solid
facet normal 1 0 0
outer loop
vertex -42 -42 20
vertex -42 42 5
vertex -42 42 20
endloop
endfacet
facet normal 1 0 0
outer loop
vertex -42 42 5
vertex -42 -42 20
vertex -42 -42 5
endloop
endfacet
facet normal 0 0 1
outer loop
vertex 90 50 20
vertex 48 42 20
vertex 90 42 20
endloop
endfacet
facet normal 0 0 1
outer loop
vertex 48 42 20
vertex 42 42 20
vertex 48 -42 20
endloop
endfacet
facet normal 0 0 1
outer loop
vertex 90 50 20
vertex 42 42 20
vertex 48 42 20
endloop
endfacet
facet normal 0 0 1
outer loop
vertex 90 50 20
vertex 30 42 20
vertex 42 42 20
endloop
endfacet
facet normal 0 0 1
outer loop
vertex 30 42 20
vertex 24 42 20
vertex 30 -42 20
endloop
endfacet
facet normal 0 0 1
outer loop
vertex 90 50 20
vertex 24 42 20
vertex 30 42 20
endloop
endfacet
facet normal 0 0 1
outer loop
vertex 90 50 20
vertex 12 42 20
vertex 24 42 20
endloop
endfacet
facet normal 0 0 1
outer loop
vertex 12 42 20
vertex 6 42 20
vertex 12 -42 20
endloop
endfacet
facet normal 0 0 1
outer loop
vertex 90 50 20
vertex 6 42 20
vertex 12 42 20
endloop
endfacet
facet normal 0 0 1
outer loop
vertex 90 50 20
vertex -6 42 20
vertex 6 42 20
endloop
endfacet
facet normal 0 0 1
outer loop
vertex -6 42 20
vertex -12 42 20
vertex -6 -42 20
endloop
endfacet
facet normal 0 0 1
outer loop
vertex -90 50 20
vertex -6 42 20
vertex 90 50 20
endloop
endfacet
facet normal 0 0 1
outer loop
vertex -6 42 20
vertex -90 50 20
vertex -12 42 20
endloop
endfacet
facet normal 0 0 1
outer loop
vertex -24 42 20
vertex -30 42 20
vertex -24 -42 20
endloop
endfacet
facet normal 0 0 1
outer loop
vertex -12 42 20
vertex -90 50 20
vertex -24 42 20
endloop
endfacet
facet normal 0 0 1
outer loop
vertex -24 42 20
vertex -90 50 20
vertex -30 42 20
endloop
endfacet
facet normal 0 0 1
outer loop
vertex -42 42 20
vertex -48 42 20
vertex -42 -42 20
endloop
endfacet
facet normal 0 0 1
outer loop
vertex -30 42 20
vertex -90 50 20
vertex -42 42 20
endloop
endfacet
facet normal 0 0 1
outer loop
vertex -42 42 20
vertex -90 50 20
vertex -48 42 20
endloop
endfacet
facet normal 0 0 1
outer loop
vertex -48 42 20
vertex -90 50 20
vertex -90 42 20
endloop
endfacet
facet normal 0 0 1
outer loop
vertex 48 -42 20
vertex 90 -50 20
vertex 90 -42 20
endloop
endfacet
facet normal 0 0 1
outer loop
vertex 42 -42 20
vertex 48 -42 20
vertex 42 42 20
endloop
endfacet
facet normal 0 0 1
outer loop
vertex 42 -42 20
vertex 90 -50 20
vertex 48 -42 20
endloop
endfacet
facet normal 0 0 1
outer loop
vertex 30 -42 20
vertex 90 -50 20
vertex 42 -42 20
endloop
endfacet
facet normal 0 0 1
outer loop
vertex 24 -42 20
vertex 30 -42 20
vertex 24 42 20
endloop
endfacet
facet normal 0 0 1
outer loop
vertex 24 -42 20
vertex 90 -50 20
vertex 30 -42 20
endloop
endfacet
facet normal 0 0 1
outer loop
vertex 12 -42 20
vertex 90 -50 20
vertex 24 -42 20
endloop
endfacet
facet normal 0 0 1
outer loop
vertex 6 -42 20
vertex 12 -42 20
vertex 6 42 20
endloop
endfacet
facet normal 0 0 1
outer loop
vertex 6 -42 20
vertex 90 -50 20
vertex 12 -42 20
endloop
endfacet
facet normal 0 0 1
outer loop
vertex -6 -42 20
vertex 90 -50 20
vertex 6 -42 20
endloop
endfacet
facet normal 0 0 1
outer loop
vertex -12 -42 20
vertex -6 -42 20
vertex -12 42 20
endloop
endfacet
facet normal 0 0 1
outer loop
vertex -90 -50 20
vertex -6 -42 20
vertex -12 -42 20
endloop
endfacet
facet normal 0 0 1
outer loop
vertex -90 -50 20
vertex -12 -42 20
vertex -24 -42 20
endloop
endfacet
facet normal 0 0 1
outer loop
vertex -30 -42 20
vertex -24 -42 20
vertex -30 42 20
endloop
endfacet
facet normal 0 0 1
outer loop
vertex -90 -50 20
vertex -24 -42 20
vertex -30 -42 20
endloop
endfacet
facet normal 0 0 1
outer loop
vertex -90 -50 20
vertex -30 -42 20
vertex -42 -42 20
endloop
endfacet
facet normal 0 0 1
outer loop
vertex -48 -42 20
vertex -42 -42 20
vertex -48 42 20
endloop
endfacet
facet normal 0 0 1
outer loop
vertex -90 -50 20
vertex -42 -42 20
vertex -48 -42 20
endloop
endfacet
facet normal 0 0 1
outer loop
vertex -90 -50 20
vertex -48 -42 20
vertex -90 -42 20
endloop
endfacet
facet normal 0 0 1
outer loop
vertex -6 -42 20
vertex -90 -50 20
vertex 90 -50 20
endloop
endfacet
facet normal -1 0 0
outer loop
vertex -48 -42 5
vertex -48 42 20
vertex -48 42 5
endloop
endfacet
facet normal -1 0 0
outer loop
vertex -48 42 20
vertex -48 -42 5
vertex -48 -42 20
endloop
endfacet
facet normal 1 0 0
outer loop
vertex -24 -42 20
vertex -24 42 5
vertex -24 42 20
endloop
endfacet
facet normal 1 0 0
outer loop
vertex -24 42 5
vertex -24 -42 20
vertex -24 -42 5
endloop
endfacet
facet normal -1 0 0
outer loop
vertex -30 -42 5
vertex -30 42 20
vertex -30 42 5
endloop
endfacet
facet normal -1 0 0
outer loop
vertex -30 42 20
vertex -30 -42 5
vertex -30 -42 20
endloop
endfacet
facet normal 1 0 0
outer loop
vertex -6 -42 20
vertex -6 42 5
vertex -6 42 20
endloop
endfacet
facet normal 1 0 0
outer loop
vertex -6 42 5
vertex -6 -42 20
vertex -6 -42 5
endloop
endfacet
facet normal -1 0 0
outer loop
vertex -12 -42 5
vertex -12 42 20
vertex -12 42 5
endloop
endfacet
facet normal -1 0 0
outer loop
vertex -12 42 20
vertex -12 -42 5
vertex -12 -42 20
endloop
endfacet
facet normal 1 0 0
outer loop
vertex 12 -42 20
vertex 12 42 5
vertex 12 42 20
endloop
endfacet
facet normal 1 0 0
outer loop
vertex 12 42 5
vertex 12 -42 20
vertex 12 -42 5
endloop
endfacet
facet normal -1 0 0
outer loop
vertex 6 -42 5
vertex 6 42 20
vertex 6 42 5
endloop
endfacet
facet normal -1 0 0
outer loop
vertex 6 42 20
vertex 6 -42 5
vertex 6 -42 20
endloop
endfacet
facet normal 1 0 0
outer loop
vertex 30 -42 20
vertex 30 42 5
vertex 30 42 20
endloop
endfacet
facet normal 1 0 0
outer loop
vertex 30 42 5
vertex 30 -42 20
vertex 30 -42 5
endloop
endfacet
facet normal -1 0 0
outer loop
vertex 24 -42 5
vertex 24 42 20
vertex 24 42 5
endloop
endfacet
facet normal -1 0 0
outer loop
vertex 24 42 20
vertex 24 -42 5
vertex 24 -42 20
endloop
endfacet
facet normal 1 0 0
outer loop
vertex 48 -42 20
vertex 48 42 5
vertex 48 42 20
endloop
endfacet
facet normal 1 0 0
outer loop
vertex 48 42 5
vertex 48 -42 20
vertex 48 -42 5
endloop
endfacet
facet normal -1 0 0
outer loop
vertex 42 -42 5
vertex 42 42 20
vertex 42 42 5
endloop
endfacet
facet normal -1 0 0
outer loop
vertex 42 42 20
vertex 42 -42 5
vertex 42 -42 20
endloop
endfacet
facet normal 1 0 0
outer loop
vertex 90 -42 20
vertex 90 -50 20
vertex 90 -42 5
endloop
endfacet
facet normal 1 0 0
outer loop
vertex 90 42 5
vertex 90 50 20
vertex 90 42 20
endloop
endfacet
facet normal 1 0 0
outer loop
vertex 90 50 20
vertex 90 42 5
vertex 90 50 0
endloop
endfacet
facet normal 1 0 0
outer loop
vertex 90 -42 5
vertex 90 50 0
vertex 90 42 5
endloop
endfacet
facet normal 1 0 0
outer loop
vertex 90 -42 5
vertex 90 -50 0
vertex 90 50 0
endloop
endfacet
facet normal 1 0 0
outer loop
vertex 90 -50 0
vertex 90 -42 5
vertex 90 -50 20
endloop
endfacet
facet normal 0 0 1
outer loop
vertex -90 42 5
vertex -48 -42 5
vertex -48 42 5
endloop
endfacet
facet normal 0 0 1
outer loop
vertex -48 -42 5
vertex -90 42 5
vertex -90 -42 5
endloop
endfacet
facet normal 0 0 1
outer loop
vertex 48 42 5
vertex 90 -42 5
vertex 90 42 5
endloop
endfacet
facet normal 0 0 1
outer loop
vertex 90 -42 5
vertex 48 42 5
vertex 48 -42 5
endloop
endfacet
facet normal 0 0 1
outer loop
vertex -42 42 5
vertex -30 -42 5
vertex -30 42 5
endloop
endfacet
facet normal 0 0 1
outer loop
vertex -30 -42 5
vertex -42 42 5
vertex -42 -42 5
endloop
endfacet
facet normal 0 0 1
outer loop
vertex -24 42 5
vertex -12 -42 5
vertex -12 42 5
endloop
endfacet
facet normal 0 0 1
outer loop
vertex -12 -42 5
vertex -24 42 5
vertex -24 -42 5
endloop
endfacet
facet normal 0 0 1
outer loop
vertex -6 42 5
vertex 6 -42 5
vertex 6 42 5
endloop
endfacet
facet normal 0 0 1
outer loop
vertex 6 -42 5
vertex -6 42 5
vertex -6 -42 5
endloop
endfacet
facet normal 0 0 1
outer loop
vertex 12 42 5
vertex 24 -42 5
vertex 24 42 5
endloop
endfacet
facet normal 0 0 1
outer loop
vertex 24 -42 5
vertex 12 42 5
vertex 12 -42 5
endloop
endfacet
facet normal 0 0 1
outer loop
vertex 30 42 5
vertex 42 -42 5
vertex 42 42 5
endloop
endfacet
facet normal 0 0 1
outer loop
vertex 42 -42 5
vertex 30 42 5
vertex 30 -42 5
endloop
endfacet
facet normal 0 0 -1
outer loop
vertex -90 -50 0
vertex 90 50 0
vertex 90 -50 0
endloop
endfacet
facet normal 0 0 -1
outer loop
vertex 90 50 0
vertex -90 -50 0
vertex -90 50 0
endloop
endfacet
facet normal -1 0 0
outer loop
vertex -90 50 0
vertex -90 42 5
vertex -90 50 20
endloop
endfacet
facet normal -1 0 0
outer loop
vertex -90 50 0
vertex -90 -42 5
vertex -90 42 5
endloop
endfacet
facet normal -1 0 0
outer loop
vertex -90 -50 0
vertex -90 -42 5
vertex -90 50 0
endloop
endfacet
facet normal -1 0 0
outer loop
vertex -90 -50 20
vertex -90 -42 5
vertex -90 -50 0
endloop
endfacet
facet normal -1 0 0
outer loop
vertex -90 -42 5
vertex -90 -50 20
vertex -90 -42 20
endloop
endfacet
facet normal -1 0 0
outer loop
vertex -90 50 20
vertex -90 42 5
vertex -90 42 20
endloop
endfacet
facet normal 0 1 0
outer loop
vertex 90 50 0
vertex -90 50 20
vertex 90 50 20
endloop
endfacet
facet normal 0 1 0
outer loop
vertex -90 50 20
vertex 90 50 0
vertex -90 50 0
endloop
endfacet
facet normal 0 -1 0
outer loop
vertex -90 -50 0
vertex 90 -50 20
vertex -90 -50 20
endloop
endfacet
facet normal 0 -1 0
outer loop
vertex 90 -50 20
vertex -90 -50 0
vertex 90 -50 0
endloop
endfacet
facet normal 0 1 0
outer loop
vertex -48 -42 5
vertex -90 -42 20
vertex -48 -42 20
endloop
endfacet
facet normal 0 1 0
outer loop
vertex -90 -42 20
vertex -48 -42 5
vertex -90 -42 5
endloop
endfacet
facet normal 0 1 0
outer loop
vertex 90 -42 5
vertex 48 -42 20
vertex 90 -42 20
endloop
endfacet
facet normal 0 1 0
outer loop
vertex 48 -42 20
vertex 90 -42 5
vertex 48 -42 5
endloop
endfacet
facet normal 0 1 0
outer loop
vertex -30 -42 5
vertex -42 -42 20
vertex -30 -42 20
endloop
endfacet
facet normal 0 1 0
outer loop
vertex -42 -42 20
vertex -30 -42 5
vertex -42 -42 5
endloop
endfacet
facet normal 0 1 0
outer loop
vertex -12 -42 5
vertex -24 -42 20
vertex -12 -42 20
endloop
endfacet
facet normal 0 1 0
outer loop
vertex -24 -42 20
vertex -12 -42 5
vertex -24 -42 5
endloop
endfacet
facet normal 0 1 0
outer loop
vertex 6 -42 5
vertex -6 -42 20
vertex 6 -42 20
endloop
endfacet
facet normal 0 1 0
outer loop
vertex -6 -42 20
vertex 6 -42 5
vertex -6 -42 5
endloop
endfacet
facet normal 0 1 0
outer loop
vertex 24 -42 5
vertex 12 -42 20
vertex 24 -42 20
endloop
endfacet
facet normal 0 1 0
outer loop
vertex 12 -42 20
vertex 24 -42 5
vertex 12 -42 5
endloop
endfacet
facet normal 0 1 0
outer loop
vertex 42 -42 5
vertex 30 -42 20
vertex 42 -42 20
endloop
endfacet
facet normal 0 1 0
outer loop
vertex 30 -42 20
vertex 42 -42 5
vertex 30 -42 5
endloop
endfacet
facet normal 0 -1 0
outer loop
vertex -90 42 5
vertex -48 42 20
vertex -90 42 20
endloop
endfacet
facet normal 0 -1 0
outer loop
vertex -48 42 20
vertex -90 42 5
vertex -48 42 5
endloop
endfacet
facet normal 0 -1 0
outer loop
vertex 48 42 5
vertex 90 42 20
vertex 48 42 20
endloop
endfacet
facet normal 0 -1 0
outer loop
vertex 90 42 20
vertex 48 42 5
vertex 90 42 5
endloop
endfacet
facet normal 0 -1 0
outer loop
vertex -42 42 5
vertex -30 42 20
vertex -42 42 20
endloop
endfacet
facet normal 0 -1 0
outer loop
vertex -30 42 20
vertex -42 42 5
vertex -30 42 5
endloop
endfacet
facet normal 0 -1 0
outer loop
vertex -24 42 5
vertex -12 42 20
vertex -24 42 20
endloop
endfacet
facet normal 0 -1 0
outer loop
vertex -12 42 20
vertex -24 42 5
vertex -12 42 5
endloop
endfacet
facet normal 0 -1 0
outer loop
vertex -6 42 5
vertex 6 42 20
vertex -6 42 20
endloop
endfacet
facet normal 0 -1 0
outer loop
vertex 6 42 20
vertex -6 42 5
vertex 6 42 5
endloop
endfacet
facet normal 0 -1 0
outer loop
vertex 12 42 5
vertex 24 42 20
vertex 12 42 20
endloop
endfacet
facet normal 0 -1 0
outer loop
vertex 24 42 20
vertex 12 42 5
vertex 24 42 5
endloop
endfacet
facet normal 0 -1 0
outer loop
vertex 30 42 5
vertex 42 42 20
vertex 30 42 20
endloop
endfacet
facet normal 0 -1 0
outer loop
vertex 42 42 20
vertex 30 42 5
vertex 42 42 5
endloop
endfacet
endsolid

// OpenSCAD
$fn = 32;

// ----------------------------------------------------------------------
// Rib frame 180 x 100 x 20
// 6 ribs at 18 mm pitch
// ----------------------------------------------------------------------

// --- parameters (mm) ---
frame = [180, 100, 5];  // base plate size (x, y, z)
rail_w = 8;             // side rail width
ribs = 6;               // number of ribs
rib_t = 6;              // rib thickness
rib_h = 15;             // rib height above the base plate
pitch = 18;             // pitch between rib centres

// --- derived feature positions (mm) ---
span = (ribs - 1) * pitch;          // = 90   distance between the outer ribs
origin_x = -span / 2;               // = -45   X of the first rib
rib_len = frame[1] - 2 * rail_w + 2;  // = 86   rib length, 1 mm into each rail
feature_centers = [
  [origin_x + 0 * pitch, 0],
  [origin_x + 1 * pitch, 0],
  [origin_x + 2 * pitch, 0],
  [origin_x + 3 * pitch, 0],
  [origin_x + 4 * pitch, 0],
  [origin_x + 5 * pitch, 0]
];   // rib centre line, drives the rib loop

// base plate, two side rails, then the ribs read straight off feature_centers
union() {
  translate([-frame[0] / 2, -frame[1] / 2, 0]) cube(frame);
  translate([-frame[0] / 2, -frame[1] / 2, 0]) cube([frame[0], rail_w, frame[2] + rib_h]);
  translate([-frame[0] / 2, frame[1] / 2 - rail_w, 0]) cube([frame[0], rail_w, frame[2] + rib_h]);
  for (centre = feature_centers)
    translate([centre[0] - rib_t / 2, centre[1] - rib_len / 2, frame[2] - 1])
      cube([rib_t, rib_len, rib_h + 1]);
}
